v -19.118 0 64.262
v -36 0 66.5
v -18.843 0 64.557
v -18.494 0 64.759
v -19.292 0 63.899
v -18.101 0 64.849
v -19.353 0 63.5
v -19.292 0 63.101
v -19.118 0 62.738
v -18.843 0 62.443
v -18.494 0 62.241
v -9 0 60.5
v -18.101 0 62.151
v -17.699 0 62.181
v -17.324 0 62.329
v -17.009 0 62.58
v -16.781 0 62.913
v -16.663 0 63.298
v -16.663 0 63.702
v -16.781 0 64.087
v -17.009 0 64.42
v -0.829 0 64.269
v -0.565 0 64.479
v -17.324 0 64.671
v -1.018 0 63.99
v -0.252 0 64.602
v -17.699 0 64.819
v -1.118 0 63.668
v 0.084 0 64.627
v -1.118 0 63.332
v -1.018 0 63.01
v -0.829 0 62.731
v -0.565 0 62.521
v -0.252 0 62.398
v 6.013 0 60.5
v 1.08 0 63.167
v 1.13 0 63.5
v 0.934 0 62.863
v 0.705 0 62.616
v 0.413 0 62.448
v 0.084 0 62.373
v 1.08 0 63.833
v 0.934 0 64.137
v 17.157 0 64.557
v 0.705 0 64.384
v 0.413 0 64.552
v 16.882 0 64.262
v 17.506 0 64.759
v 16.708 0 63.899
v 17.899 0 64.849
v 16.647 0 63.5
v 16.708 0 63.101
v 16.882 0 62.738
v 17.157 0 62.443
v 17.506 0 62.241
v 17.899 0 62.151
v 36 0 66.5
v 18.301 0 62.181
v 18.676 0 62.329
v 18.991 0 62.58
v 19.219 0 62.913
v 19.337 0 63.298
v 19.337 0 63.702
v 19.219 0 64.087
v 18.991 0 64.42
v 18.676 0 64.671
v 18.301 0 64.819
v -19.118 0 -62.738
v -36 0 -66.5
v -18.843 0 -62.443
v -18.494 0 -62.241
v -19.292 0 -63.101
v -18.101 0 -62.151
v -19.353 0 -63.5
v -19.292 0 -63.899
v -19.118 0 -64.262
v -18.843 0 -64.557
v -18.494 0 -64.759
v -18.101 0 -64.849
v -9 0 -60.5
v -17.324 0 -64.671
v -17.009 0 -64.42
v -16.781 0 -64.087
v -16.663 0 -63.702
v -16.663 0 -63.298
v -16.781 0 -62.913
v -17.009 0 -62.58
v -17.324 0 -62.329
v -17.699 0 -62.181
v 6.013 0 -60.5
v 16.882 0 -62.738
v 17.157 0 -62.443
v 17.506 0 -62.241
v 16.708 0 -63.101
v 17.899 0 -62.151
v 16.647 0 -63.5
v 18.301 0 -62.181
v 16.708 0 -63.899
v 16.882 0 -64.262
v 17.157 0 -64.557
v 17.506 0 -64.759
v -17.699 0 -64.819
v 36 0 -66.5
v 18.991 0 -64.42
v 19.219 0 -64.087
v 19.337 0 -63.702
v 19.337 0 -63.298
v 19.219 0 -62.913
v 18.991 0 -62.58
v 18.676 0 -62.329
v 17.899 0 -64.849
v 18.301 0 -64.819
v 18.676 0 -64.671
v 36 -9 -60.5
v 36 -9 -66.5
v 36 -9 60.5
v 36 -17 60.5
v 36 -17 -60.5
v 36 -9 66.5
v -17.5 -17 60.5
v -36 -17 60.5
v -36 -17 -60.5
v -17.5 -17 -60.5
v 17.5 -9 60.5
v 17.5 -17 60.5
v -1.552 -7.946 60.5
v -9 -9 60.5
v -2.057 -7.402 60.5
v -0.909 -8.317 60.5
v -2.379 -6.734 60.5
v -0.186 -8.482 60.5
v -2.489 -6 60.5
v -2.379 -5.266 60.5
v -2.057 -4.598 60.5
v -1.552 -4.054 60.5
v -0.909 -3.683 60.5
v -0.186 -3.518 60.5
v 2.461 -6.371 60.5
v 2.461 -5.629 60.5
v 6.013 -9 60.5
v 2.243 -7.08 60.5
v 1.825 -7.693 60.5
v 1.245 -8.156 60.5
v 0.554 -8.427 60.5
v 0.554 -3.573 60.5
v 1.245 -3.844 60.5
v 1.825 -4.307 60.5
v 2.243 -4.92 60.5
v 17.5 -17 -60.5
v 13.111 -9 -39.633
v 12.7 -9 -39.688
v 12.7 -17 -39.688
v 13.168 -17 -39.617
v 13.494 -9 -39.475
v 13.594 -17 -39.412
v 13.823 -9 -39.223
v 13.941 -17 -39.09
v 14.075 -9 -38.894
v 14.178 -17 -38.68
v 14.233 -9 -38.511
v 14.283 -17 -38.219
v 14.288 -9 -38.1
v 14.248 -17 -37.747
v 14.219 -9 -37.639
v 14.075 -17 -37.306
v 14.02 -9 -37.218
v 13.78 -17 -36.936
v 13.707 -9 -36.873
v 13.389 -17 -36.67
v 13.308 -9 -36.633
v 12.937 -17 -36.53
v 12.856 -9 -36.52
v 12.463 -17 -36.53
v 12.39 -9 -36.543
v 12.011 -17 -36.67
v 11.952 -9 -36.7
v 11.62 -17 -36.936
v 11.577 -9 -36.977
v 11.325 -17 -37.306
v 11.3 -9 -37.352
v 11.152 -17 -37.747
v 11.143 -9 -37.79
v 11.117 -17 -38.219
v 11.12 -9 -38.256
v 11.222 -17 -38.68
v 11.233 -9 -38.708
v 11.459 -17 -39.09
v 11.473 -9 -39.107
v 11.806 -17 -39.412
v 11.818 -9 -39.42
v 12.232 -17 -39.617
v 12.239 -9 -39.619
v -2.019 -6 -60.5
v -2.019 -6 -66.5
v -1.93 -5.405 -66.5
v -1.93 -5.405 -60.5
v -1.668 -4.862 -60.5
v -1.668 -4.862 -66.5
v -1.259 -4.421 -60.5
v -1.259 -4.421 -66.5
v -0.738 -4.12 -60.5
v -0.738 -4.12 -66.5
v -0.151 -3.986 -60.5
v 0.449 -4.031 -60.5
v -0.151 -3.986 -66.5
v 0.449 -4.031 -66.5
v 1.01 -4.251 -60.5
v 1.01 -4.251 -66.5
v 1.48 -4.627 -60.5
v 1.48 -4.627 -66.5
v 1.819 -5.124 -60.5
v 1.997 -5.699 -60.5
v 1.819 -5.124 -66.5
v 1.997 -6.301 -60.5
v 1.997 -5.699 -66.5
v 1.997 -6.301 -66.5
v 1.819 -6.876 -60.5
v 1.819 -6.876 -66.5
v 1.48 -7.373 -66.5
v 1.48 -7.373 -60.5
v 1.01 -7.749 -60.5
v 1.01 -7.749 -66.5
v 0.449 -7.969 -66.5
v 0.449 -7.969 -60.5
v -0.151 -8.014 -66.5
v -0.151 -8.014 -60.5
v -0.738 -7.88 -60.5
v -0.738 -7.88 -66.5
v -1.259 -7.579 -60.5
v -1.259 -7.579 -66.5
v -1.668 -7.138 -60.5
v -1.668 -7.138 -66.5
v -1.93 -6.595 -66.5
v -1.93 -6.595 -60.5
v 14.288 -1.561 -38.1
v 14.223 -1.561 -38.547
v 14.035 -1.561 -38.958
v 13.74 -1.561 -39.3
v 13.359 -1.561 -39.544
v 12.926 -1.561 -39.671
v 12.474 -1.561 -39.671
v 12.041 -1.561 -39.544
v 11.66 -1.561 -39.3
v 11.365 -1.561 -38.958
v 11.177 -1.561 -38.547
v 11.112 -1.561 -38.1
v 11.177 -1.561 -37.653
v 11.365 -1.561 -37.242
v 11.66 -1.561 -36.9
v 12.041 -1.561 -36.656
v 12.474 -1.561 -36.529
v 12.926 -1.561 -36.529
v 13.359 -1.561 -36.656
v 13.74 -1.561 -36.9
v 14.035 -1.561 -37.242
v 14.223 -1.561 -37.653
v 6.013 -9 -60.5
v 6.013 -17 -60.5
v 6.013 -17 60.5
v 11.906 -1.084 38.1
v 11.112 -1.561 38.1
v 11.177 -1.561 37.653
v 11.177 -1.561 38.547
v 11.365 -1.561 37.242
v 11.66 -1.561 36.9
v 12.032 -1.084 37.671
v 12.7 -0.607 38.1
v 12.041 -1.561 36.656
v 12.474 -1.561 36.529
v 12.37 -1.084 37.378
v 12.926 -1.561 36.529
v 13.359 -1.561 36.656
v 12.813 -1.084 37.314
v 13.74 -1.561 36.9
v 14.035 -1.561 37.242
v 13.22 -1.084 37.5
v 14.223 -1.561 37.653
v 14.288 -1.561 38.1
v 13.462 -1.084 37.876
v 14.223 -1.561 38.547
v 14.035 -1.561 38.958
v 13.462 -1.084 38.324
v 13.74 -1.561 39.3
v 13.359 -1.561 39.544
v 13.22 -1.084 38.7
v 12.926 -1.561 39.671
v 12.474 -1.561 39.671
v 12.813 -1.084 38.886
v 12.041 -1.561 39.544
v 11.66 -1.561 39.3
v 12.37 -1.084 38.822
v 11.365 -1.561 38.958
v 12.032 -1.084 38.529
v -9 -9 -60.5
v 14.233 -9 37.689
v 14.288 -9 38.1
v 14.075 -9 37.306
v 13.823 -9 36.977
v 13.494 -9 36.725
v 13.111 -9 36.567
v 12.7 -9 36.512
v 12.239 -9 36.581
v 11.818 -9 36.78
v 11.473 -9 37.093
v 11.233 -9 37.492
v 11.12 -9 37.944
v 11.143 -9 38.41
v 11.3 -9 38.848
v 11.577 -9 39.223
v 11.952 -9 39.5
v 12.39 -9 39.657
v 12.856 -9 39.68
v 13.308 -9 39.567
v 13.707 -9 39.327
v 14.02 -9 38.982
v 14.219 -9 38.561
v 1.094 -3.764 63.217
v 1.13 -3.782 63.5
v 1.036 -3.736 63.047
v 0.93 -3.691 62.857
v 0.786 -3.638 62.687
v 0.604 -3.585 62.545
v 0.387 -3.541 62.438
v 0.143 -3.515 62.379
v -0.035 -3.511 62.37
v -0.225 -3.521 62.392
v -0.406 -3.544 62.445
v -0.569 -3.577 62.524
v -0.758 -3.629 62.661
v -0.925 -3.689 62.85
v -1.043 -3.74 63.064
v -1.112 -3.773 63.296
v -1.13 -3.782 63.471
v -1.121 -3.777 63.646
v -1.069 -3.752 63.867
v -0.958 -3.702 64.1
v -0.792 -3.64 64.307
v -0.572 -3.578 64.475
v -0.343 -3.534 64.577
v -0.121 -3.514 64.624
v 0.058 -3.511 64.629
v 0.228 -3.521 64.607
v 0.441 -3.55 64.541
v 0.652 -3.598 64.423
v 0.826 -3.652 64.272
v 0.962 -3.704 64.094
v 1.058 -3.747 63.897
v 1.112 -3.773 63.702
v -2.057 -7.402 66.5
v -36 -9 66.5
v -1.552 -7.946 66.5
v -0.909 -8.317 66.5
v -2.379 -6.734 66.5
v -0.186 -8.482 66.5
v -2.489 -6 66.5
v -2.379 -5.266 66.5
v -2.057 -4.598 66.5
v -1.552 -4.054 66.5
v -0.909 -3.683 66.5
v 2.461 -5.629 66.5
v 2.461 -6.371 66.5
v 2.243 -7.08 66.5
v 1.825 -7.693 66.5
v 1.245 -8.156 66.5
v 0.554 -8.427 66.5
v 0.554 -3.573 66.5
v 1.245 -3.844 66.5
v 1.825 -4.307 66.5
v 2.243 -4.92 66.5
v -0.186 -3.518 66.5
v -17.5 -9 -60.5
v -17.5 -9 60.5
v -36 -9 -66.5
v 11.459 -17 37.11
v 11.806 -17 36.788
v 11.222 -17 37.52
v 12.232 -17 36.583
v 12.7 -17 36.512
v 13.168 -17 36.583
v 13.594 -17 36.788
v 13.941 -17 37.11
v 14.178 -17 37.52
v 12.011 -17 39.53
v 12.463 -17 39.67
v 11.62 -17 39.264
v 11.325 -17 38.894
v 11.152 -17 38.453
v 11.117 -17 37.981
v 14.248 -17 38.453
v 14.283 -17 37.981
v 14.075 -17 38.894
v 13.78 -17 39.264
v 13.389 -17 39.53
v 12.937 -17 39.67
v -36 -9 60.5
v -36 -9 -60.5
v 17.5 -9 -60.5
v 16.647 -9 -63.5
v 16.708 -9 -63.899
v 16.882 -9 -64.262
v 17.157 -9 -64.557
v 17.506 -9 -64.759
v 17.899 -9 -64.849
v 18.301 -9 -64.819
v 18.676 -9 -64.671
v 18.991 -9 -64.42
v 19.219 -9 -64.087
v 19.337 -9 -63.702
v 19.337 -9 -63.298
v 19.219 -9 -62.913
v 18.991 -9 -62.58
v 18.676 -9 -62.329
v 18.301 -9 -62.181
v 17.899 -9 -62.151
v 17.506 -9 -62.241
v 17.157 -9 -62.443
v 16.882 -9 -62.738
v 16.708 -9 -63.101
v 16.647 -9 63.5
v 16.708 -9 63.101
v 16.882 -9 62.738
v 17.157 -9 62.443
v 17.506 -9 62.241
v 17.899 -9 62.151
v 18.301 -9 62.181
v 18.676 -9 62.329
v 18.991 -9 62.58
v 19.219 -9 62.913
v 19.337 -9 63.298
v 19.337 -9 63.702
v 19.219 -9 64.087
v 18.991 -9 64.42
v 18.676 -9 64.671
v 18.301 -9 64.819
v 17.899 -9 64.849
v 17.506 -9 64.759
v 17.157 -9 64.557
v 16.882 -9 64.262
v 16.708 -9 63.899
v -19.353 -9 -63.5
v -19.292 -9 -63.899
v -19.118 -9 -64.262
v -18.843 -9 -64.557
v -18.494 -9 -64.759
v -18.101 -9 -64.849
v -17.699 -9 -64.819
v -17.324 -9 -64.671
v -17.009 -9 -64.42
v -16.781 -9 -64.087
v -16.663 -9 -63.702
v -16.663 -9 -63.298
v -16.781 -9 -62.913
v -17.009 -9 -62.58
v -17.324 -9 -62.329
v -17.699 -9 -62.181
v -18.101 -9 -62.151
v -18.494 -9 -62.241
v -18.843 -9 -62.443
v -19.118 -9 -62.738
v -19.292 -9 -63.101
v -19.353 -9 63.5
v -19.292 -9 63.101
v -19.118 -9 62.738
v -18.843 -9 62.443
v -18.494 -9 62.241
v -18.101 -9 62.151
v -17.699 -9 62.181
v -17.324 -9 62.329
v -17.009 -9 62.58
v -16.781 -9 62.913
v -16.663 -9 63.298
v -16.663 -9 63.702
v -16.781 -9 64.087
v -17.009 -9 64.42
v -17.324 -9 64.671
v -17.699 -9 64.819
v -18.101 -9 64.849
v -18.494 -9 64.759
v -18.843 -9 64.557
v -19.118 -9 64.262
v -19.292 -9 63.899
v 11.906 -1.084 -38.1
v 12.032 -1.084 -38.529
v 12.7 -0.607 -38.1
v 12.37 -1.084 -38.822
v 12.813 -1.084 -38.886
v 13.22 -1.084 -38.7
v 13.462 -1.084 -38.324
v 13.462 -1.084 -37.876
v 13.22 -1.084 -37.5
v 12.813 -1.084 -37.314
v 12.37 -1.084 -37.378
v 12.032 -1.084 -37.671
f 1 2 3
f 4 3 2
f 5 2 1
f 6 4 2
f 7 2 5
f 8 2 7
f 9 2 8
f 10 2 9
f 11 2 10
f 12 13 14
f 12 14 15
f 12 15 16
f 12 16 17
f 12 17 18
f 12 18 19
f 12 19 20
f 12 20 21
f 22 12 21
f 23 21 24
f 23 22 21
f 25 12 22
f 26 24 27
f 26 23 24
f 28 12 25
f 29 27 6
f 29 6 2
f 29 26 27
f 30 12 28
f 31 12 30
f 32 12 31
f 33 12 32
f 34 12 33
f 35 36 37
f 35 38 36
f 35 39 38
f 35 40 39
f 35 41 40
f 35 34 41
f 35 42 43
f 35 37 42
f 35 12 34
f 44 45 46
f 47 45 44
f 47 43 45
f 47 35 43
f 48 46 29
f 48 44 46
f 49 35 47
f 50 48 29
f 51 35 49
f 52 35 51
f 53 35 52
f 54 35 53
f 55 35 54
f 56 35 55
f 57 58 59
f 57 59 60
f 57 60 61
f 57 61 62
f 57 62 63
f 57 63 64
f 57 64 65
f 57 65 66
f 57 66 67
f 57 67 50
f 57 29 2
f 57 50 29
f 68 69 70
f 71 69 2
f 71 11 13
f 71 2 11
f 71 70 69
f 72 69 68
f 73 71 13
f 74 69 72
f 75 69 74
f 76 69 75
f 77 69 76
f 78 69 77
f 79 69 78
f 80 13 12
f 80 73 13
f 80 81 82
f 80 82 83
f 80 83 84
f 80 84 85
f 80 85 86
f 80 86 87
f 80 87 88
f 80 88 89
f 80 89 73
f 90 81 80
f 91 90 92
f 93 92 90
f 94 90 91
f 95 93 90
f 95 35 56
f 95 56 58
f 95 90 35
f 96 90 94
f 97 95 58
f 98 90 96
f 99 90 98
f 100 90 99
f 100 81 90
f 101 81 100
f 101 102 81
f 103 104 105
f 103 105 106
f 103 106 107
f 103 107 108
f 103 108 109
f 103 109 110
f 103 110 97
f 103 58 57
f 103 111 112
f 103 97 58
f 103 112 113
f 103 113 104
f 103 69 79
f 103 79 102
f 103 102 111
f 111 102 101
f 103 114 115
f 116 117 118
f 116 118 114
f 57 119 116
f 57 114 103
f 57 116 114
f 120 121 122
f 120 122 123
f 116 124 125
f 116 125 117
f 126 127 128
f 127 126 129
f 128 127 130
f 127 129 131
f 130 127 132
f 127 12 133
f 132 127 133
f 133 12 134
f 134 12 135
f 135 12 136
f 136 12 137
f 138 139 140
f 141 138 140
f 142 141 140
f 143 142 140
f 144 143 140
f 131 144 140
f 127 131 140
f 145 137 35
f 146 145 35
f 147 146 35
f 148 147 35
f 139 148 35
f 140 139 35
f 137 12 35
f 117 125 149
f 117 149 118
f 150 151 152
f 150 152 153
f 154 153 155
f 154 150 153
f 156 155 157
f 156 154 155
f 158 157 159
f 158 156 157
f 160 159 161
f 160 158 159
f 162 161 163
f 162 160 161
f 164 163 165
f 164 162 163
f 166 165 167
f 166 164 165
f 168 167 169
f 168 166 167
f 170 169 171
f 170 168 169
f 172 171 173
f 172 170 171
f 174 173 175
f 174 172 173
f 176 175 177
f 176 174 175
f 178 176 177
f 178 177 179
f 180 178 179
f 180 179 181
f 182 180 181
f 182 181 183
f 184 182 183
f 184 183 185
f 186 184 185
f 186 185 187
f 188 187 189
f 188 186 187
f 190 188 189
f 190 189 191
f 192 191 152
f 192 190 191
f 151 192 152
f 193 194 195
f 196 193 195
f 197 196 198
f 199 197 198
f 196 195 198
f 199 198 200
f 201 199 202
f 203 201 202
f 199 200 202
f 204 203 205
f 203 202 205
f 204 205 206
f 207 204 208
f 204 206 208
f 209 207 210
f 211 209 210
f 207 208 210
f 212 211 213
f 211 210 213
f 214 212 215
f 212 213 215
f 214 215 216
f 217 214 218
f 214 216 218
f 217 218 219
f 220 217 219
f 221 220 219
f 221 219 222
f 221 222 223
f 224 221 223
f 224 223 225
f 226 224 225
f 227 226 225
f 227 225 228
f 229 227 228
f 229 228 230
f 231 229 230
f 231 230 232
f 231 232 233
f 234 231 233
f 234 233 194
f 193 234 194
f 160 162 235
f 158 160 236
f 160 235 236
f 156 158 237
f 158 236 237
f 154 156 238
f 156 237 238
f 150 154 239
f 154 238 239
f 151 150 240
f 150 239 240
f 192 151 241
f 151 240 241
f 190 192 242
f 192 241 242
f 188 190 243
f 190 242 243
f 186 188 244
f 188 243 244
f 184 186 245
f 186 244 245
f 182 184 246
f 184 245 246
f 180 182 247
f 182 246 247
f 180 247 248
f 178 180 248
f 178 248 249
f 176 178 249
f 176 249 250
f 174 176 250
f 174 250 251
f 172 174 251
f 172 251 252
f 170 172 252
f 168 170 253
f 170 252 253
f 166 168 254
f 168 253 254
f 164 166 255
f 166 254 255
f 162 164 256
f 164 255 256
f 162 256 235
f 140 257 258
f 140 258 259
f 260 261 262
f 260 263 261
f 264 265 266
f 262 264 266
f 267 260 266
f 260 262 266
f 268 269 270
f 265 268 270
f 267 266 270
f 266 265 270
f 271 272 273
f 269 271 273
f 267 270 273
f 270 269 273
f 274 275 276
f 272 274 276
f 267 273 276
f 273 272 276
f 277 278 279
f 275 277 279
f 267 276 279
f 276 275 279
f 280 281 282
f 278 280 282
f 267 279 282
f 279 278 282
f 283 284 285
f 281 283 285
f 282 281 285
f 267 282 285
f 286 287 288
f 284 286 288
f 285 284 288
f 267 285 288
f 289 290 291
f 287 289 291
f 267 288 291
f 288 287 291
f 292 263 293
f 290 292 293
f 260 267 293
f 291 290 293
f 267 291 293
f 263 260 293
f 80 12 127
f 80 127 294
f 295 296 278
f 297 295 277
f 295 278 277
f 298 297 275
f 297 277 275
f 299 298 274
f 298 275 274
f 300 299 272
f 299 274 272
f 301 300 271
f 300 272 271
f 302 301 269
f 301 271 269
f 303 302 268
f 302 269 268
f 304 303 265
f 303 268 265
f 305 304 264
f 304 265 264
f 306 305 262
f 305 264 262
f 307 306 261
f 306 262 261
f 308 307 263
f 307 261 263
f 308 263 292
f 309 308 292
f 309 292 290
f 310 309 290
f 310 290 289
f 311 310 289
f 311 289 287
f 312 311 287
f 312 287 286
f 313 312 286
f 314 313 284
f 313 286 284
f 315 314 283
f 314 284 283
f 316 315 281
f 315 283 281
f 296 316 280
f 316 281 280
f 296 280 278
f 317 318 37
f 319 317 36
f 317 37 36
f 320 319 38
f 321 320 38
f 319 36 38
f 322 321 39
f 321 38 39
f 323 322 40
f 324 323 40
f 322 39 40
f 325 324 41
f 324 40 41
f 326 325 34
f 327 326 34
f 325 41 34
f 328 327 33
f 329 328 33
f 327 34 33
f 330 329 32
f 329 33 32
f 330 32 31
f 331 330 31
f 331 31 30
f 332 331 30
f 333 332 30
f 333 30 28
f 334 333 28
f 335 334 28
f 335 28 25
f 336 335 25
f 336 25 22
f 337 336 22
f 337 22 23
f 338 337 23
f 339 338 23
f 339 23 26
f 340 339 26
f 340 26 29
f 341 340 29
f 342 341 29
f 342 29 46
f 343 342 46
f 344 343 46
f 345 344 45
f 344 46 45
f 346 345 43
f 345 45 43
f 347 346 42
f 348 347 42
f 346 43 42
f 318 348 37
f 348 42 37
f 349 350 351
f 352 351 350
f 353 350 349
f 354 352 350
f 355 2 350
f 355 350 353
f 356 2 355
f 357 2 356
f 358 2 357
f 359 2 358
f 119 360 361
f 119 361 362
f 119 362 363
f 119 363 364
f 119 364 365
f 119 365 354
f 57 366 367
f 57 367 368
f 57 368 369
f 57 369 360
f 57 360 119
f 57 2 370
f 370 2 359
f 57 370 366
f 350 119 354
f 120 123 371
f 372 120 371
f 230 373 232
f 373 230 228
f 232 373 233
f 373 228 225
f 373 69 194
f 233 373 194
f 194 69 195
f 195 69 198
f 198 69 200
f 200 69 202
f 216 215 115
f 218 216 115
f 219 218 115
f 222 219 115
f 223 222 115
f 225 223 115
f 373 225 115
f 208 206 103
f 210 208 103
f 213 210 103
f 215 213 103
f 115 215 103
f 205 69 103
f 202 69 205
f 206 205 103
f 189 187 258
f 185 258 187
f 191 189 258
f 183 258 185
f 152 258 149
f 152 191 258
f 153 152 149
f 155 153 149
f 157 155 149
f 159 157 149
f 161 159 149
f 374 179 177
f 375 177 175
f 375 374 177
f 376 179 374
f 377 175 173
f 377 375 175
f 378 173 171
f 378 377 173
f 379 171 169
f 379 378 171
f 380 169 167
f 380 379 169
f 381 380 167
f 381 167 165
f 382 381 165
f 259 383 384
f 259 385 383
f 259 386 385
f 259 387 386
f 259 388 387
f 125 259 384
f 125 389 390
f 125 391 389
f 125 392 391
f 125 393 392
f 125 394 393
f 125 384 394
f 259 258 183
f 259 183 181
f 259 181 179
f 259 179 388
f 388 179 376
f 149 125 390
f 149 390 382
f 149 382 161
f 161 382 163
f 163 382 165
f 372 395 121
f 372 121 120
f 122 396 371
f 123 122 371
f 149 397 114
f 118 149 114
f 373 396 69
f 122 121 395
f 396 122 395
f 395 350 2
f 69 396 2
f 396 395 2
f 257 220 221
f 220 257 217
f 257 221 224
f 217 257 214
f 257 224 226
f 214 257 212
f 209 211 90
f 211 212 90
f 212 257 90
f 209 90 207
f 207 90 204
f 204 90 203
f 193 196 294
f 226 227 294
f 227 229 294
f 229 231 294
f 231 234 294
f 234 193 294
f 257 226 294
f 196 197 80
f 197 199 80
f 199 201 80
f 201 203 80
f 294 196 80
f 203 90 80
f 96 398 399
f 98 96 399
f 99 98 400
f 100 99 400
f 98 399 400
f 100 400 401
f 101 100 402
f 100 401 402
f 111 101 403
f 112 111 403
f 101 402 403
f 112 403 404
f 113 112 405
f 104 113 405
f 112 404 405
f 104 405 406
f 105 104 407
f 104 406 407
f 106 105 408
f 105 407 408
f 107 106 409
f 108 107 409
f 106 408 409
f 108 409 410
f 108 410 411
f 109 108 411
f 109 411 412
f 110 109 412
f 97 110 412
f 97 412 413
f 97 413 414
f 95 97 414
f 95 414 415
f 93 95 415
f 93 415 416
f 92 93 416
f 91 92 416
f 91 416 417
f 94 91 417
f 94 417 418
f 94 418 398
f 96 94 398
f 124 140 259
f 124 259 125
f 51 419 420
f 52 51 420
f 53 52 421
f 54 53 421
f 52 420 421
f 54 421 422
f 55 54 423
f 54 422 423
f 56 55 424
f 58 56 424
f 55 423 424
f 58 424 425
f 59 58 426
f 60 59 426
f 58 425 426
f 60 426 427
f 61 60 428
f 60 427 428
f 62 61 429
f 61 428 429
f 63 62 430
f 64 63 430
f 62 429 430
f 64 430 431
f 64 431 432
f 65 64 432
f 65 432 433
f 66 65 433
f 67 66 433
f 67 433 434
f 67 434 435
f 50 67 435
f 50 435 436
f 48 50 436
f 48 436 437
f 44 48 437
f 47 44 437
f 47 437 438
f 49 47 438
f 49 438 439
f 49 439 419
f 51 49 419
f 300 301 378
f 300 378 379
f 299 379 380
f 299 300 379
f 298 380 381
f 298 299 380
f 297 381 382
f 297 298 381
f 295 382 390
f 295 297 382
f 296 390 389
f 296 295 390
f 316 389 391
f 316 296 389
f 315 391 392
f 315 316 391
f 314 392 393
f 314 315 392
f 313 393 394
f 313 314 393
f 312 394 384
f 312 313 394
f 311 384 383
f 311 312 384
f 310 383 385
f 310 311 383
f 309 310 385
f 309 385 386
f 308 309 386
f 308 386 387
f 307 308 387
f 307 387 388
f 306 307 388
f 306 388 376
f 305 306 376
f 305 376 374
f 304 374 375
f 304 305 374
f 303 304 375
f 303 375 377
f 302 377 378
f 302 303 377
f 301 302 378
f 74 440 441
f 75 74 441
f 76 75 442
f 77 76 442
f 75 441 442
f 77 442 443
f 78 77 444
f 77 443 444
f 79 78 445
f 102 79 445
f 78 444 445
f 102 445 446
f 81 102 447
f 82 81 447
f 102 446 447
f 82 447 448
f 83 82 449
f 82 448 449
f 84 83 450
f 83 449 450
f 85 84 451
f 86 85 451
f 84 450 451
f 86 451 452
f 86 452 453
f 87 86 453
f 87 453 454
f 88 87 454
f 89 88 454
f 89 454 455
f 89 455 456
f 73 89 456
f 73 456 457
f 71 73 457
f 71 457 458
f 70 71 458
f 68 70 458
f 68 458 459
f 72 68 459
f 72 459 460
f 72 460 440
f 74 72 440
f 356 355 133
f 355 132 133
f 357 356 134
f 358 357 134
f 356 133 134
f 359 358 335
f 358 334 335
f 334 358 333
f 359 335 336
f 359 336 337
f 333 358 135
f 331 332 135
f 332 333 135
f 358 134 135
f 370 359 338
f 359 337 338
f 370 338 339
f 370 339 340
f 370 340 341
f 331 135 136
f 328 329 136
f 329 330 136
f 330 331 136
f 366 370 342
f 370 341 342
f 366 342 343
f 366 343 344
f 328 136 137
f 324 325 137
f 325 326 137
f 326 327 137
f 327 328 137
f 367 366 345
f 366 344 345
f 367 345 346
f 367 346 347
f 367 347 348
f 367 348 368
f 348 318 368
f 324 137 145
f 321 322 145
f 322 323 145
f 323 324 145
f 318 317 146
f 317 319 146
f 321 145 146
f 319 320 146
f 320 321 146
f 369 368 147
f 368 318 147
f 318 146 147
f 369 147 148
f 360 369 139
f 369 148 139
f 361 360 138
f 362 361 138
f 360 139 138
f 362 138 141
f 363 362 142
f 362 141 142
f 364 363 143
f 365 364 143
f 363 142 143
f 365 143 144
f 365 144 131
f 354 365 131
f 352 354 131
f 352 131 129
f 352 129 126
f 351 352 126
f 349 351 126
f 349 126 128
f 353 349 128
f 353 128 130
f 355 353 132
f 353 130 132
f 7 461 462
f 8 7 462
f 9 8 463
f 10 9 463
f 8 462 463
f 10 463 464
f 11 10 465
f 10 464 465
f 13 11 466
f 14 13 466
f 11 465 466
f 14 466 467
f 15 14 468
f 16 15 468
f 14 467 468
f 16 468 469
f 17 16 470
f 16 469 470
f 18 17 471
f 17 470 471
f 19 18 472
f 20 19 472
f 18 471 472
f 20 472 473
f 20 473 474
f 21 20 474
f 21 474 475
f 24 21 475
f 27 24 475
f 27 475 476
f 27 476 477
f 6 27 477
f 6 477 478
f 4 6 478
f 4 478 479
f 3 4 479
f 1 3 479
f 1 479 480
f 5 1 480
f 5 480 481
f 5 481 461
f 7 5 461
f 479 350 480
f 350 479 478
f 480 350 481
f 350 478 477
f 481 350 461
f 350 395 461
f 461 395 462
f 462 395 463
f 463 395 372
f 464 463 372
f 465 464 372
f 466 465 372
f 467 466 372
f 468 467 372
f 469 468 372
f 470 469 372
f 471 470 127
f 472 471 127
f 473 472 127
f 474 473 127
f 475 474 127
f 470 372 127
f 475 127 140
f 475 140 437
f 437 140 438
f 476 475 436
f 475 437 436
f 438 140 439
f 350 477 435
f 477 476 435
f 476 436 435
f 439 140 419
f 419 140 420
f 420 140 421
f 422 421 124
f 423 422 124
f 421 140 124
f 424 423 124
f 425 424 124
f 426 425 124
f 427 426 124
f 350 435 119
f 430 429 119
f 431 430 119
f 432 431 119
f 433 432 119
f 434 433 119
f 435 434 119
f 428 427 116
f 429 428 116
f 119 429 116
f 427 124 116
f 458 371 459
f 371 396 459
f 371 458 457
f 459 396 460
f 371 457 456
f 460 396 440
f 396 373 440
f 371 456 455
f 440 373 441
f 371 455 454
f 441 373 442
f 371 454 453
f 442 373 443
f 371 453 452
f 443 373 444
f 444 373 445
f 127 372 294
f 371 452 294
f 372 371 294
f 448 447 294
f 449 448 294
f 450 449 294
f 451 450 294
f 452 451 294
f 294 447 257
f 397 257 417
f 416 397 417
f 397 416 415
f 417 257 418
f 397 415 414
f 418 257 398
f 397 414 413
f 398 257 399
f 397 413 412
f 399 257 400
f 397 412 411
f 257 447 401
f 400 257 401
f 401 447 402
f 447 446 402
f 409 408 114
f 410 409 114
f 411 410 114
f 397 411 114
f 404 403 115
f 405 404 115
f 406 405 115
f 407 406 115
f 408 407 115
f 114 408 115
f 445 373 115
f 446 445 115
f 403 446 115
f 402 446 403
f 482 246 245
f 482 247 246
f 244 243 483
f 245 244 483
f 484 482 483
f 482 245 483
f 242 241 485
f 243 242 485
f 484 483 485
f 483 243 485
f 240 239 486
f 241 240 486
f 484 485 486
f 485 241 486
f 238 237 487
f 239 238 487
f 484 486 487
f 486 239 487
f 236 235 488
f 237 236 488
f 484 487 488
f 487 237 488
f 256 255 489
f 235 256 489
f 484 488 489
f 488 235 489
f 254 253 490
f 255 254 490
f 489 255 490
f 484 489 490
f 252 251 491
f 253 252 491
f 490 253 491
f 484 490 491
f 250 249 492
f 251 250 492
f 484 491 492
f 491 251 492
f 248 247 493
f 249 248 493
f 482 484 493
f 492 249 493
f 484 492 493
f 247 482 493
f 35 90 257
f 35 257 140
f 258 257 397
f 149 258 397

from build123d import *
from build123d.topology import SkipClean

# Parameters (mm, degrees)
SKETCH1_W                        = 91
SKETCH1_H                        = 133
BOSS_EXTRUDE1_DEPTH              = 9
SKETCH8_W                        = 85.75
SKETCH8_H                        = 121
BOSS_EXTRUDE2_DEPTH              = 8
F_1_8_0_125_DIAMETER_HOLE1_D     = 3.175
F_1_8_0_125_DIAMETER_HOLE1_DEPTH = 15.439
F_1_8_0_125_DIAMETER_HOLE1_TIP   = 0.953866233
CUT_EXTRUDE1_DEPTH               = 83.349863388
CUT_EXTRUDE1_DEPTH_BACK          = 83.349863388
SKETCH9_W                        = 35
SKETCH9_H                        = 8
CUT_EXTRUDE2_DEPTH               = 83.349863388
TAP_DRILL_FOR_10_32_TAP1_D       = 4.0386
TAP_DRILL_FOR_10_32_TAP1_DEPTH   = 6
F_10_CLEARANCE_HOLE1_D           = 4.9784
F_10_CLEARANCE_HOLE1_DEPTH       = 6
TAP_DRILL_FOR_4_40_TAP1_REACH    = 84.35
TAP_DRILL_FOR_4_40_TAP1_BORE_R   = 1.1303
TAP_DRILL_FOR_6_32_TAP1_D        = 2.7051
CUT_EXTRUDE4_REACH               = 143.592
SKETCH20_W                       = 9.5
SKETCH20_H                       = 9
CUT_EXTRUDE5_DEPTH               = 81.929077829
CUT_EXTRUDE5_DEPTH_BACK          = 81.929077829
SKETCH21_OUTSIDE_W               = 119.582
SKETCH21_OUTSIDE_H               = 166.832
SKETCH21_OUTSIDE_W_2             = 72
SKETCH21_OUTSIDE_H_2             = 133
SKETCH22_W                       = 11.4873
SKETCH22_H                       = 121
SKETCH22_R                       = 1.5875
BOSS_EXTRUDE3_DEPTH              = 8


with BuildPart() as part:
    # Sketch1 → Boss-Extrude1 (new body)
    with BuildSketch(Plane(origin=(0, 0, 0), x_dir=(1, 0, 0), z_dir=(0, 1, 0))):
        Rectangle(SKETCH1_W, SKETCH1_H)
    extrude(amount=-BOSS_EXTRUDE1_DEPTH)

    # Sketch8 → Boss-Extrude2 (add)
    with BuildSketch(Plane.XZ.offset(9)):
        Rectangle(SKETCH8_W, SKETCH8_H)
    extrude(amount=BOSS_EXTRUDE2_DEPTH)

    # 1/8 (0.125) Diameter Hole1
    with Locations(Plane(origin=(0, -17, 0), x_dir=(-1, 0, 0), z_dir=(0, -1, 0))):
        with Locations((-12.7, -38.1), (-12.7, 38.1)):
            Hole(F_1_8_0_125_DIAMETER_HOLE1_D / 2, depth=F_1_8_0_125_DIAMETER_HOLE1_DEPTH)
            with Locations((0, 0, -(F_1_8_0_125_DIAMETER_HOLE1_DEPTH + F_1_8_0_125_DIAMETER_HOLE1_TIP / 2))):  # 118° drill point
                Cone(0, F_1_8_0_125_DIAMETER_HOLE1_D / 2, F_1_8_0_125_DIAMETER_HOLE1_TIP, mode=Mode.SUBTRACT)

    # Sketch9 → Cut-Extrude1 (cut, two sides: drawn at the far end of the back side and taken through both)
    with BuildSketch(Plane.XY.offset(-CUT_EXTRUDE1_DEPTH_BACK)):
        with Locations((0, -13)):
            Rectangle(SKETCH9_W, SKETCH9_H)
    extrude(amount=CUT_EXTRUDE1_DEPTH + CUT_EXTRUDE1_DEPTH_BACK, mode=Mode.SUBTRACT)

    # Sketch10 → Cut-Extrude2 (cut, through all)
    with BuildSketch(Plane(origin=(0, 0, 0), x_dir=(1, 0, 0), z_dir=(0, 1, 0))):
        Polygon((-6, 60.5), (6, 60.5), (6.0127, 60.5), (6.0127, -60.5), (6, -60.5), (-6, -60.5), (-9, -60.5), (-9, 60.5), align=None)
    extrude(amount=-CUT_EXTRUDE2_DEPTH, mode=Mode.SUBTRACT)

    # Tap Drill for #10-32 Tap1
    with Locations(Plane.XY.offset(-60.5)):
        with Locations((0, -6)):
            Hole(TAP_DRILL_FOR_10_32_TAP1_D / 2, depth=TAP_DRILL_FOR_10_32_TAP1_DEPTH)

    # #10 Clearance Hole1
    with Locations(Plane.XY.offset(66.5)):
        with Locations((0, -6)):
            Hole(F_10_CLEARANCE_HOLE1_D / 2, depth=F_10_CLEARANCE_HOLE1_DEPTH)

    # Tap Drill for #4-40 Tap1 bore → Tap Drill for #4-40 Tap1 (cut, up to next)
    with BuildSketch(Plane(origin=(0, 0, 0), x_dir=(1, 0, 0), z_dir=(0, 1, 0)), mode=Mode.PRIVATE) as tap_drill_for_4_40_tap1_sk1:
        with Locations((0, -63.5)):
            Circle(TAP_DRILL_FOR_4_40_TAP1_BORE_R)
    tap_drill_for_4_40_tap1_tool1 = extrude(tap_drill_for_4_40_tap1_sk1.sketch, amount=-TAP_DRILL_FOR_4_40_TAP1_REACH, mode=Mode.PRIVATE) & part.part
    add(tap_drill_for_4_40_tap1_tool1.solids().sort_by_distance((0, 0, 63.5))[0], mode=Mode.SUBTRACT)

    # Tap Drill for #6-32 Tap1 (through all)
    with Locations(Plane(origin=(0, 0, 0), x_dir=(1, 0, 0), z_dir=(0, 1, 0))):
        with Locations((-18, -63.5), (18, -63.5), (18, 63.5), (-18, 63.5)):
            Hole(TAP_DRILL_FOR_6_32_TAP1_D / 2)

    # Sketch20 → Cut-Extrude4 (cut, up to next)
    with BuildSketch(Plane.XY.offset(66.5), mode=Mode.PRIVATE) as cut_extrude4_sk1:
        with Locations((40.75, -4.5)):
            Rectangle(SKETCH20_W, SKETCH20_H)
    cut_extrude4_tool1 = extrude(cut_extrude4_sk1.sketch, amount=-CUT_EXTRUDE4_REACH, mode=Mode.PRIVATE) & part.part
    # Sketch20 → Cut-Extrude4 (cut, up to next)
    with BuildSketch(Plane.XY.offset(66.5), mode=Mode.PRIVATE) as cut_extrude4_sk2:
        with Locations((-40.75, -4.5)):
            Rectangle(SKETCH20_W, SKETCH20_H)
    cut_extrude4_tool2 = extrude(cut_extrude4_sk2.sketch, amount=-CUT_EXTRUDE4_REACH, mode=Mode.PRIVATE) & part.part
    add(cut_extrude4_tool1.solids().sort_by_distance((40.75, -4.5, 66.5))[0], mode=Mode.SUBTRACT)
    add(cut_extrude4_tool2.solids().sort_by_distance((-40.75, -4.5, 66.5))[0], mode=Mode.SUBTRACT)

    # Sketch21 outside → Cut-Extrude5 (cut, two sides: drawn at the far end of the back side and taken through both)
    with BuildSketch(Plane(origin=(0, 0, 0), x_dir=(1, 0, 0), z_dir=(0, 1, 0)).offset(-CUT_EXTRUDE5_DEPTH_BACK)):
        Rectangle(SKETCH21_OUTSIDE_W, SKETCH21_OUTSIDE_H)
        Rectangle(SKETCH21_OUTSIDE_W_2, SKETCH21_OUTSIDE_H_2, mode=Mode.SUBTRACT)
    extrude(amount=CUT_EXTRUDE5_DEPTH + CUT_EXTRUDE5_DEPTH_BACK, mode=Mode.SUBTRACT)

    # Sketch22 → Boss-Extrude3 (add)
    with SkipClean():  # the faces are left unmerged after this step: merging them gives an invalid solid
        with BuildSketch(Plane.XZ.offset(9)):
            with Locations((11.75635, 0)):
                Rectangle(SKETCH22_W, SKETCH22_H)
            with Locations(Location((12.7, 38.1, 0), (0, 0, 270))):
                Circle(SKETCH22_R, mode=Mode.SUBTRACT)
            with Locations(Location((12.7, -38.1, 0), (0, 0, 270))):
                Circle(SKETCH22_R, mode=Mode.SUBTRACT)
        extrude(amount=BOSS_EXTRUDE3_DEPTH)


solid = part.part
